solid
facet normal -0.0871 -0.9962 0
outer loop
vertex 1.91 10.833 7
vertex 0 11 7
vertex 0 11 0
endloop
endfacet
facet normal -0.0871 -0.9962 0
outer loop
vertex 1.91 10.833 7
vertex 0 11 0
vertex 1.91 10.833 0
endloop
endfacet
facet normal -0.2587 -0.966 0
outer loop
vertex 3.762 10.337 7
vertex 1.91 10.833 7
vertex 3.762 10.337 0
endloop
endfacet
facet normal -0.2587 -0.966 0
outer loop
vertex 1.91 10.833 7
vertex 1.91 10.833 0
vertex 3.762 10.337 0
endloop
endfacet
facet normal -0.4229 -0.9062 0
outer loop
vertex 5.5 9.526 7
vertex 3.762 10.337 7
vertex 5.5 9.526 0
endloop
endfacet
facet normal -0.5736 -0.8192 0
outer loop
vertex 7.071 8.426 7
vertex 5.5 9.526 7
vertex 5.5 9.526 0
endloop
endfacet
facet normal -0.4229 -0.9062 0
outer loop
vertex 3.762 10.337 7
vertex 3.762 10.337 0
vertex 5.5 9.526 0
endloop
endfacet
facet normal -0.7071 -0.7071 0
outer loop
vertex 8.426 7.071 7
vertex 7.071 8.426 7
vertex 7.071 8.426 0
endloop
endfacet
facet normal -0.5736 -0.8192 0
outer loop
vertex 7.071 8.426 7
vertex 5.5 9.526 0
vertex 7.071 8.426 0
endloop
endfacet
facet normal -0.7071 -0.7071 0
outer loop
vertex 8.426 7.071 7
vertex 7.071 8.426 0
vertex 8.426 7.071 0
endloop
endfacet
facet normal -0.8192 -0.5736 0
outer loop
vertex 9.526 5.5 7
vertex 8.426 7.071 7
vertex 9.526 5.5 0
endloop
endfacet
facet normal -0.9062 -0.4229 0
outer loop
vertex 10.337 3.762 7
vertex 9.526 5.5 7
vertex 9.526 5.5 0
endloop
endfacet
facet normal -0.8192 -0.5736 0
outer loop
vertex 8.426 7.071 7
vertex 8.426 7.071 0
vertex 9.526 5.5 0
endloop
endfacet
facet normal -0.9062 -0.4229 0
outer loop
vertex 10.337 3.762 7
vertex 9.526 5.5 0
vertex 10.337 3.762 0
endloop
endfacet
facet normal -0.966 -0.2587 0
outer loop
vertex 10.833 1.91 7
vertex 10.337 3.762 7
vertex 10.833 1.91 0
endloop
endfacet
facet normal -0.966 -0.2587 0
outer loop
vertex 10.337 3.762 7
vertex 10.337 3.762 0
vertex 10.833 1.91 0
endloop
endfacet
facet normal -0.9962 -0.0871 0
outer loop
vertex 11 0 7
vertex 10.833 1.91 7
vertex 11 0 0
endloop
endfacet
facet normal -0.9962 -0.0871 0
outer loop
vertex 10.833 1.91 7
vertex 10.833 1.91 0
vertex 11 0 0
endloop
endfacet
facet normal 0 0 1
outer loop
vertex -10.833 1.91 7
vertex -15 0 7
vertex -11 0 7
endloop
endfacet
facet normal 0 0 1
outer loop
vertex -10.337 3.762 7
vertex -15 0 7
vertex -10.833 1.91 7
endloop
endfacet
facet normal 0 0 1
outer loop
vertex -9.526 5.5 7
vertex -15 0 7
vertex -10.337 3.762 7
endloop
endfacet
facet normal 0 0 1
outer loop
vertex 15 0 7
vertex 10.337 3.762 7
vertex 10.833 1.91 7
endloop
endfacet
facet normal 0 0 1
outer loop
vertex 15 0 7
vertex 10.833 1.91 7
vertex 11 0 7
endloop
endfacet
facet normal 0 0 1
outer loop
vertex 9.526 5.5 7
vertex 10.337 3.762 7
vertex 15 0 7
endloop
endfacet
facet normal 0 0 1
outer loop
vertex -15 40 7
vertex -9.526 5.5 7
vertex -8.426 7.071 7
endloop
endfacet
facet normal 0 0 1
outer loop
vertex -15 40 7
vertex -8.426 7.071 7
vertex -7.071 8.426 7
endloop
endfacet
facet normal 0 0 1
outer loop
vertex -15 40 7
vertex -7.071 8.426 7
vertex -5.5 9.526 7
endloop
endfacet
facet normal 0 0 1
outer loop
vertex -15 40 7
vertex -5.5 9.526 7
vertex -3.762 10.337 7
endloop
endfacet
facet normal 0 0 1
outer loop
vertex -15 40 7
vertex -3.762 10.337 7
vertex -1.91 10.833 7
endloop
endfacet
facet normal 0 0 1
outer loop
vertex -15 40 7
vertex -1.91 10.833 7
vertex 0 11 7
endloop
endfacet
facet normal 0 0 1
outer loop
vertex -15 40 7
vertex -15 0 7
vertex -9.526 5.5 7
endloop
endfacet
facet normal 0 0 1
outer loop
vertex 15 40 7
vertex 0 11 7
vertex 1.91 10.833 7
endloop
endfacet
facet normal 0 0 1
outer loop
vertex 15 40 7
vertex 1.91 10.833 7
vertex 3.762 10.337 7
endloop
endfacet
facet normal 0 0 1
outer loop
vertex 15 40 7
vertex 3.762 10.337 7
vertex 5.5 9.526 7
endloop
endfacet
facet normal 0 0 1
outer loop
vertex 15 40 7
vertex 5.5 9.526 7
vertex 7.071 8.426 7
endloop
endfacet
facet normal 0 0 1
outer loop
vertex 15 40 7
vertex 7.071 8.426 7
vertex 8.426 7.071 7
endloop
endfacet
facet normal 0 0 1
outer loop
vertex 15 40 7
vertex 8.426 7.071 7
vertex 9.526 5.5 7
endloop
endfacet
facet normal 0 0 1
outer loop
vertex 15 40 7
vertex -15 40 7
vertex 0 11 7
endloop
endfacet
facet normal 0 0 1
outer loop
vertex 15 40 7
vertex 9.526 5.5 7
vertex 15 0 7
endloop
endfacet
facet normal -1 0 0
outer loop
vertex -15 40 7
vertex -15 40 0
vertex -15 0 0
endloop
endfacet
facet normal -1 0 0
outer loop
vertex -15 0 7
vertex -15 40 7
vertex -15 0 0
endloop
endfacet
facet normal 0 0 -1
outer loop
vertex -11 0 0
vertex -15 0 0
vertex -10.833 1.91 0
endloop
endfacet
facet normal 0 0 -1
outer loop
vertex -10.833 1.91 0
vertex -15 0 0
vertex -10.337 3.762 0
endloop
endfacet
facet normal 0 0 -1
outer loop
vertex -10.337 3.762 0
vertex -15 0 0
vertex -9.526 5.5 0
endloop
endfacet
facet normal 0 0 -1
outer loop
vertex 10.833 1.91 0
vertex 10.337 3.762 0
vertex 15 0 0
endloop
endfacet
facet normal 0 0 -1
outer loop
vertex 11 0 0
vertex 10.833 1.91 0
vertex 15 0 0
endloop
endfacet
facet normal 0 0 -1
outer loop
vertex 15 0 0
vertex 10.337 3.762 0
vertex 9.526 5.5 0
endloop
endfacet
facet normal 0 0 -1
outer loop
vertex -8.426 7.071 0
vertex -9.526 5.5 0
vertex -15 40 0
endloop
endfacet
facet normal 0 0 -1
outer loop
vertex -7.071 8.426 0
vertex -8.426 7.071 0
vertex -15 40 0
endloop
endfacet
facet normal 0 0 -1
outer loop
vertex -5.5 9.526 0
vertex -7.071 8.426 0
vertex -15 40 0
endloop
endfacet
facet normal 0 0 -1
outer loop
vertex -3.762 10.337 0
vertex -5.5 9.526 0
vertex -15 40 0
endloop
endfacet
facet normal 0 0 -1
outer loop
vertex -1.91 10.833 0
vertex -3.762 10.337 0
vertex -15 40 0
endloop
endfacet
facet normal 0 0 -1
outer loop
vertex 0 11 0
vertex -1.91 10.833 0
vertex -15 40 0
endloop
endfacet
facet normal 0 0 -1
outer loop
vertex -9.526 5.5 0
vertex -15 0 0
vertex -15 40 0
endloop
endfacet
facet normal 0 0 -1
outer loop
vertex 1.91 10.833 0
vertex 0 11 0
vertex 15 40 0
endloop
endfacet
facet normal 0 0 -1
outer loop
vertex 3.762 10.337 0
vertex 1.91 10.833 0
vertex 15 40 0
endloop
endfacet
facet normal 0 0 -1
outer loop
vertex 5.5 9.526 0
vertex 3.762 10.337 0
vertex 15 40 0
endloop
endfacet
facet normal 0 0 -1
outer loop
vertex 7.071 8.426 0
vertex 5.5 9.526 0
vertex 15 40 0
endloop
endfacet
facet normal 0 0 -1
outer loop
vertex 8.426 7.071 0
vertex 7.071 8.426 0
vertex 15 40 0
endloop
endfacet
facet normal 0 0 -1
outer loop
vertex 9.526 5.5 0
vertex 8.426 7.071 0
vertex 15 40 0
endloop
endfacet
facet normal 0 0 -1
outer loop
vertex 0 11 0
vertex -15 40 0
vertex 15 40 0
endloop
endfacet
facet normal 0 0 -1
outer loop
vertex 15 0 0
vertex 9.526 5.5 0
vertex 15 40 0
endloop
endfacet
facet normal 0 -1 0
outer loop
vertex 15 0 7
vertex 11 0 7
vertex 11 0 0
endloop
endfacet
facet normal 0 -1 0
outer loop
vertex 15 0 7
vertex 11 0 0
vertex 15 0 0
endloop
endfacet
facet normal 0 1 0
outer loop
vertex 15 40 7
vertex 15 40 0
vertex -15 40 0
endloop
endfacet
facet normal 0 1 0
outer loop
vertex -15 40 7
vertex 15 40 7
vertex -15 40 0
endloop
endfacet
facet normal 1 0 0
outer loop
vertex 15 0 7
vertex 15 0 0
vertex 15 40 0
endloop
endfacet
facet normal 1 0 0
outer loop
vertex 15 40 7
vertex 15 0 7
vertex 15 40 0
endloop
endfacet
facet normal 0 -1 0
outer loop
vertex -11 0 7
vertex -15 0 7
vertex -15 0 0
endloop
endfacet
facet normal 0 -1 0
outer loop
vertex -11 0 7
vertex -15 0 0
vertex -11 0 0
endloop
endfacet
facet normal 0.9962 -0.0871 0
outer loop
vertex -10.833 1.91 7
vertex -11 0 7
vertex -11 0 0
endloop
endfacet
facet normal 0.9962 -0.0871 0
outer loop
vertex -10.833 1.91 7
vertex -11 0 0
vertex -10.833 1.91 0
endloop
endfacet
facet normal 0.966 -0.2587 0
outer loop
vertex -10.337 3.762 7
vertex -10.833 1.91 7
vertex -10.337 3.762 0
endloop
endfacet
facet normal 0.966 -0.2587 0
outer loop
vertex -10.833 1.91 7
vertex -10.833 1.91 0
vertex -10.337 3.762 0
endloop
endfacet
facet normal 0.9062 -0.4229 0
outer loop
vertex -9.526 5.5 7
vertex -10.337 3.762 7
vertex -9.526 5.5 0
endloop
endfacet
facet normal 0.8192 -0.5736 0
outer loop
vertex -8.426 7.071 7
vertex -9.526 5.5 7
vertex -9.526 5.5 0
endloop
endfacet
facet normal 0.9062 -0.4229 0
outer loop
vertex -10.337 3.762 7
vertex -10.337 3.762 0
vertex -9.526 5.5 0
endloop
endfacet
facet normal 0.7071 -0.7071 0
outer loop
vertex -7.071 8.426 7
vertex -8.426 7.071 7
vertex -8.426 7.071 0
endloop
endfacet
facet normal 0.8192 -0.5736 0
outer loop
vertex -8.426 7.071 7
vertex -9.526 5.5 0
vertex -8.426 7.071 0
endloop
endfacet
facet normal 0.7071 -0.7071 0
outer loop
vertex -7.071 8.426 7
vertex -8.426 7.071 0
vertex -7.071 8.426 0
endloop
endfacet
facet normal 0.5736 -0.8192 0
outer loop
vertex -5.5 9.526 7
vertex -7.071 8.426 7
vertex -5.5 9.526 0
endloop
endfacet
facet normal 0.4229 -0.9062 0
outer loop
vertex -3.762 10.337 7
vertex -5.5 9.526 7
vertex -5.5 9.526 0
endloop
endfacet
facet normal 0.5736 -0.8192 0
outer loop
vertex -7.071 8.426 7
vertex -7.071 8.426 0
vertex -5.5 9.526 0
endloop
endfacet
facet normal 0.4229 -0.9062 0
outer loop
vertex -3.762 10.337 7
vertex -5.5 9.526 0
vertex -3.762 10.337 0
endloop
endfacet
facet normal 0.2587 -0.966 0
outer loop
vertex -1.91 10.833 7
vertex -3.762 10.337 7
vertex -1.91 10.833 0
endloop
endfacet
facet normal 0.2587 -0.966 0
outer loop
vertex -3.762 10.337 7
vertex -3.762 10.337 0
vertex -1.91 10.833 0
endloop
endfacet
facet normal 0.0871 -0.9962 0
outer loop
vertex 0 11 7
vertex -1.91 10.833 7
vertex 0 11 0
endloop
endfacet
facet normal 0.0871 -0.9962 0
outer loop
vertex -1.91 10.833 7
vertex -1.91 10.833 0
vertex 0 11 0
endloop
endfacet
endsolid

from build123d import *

# Parameters (mm, degrees)
F1_DEPTH = 7


with BuildPart() as f1:
    # F0 (on Top) → F1 (new body)
    with BuildSketch(Plane.XY):
        with BuildLine():
            ThreePointArc((-11, 0), (-7.778175, 7.778175), (0, 11))
            Line((0, 11), (0, 40))
            Line((0, 40), (-15, 40))
            Line((-15, 40), (-15, 0))
            Line((-15, 0), (-11, 0))
        make_face()
        with BuildLine():
            ThreePointArc((0, 11), (7.778175, 7.778175), (11, 0))
            Line((11, 0), (15, 0))
            Line((15, 0), (15, 40))
            Line((15, 40), (0, 40))
            Line((0, 40), (0, 11))
        make_face()
    extrude(amount=F1_DEPTH)


solid = f1.part
